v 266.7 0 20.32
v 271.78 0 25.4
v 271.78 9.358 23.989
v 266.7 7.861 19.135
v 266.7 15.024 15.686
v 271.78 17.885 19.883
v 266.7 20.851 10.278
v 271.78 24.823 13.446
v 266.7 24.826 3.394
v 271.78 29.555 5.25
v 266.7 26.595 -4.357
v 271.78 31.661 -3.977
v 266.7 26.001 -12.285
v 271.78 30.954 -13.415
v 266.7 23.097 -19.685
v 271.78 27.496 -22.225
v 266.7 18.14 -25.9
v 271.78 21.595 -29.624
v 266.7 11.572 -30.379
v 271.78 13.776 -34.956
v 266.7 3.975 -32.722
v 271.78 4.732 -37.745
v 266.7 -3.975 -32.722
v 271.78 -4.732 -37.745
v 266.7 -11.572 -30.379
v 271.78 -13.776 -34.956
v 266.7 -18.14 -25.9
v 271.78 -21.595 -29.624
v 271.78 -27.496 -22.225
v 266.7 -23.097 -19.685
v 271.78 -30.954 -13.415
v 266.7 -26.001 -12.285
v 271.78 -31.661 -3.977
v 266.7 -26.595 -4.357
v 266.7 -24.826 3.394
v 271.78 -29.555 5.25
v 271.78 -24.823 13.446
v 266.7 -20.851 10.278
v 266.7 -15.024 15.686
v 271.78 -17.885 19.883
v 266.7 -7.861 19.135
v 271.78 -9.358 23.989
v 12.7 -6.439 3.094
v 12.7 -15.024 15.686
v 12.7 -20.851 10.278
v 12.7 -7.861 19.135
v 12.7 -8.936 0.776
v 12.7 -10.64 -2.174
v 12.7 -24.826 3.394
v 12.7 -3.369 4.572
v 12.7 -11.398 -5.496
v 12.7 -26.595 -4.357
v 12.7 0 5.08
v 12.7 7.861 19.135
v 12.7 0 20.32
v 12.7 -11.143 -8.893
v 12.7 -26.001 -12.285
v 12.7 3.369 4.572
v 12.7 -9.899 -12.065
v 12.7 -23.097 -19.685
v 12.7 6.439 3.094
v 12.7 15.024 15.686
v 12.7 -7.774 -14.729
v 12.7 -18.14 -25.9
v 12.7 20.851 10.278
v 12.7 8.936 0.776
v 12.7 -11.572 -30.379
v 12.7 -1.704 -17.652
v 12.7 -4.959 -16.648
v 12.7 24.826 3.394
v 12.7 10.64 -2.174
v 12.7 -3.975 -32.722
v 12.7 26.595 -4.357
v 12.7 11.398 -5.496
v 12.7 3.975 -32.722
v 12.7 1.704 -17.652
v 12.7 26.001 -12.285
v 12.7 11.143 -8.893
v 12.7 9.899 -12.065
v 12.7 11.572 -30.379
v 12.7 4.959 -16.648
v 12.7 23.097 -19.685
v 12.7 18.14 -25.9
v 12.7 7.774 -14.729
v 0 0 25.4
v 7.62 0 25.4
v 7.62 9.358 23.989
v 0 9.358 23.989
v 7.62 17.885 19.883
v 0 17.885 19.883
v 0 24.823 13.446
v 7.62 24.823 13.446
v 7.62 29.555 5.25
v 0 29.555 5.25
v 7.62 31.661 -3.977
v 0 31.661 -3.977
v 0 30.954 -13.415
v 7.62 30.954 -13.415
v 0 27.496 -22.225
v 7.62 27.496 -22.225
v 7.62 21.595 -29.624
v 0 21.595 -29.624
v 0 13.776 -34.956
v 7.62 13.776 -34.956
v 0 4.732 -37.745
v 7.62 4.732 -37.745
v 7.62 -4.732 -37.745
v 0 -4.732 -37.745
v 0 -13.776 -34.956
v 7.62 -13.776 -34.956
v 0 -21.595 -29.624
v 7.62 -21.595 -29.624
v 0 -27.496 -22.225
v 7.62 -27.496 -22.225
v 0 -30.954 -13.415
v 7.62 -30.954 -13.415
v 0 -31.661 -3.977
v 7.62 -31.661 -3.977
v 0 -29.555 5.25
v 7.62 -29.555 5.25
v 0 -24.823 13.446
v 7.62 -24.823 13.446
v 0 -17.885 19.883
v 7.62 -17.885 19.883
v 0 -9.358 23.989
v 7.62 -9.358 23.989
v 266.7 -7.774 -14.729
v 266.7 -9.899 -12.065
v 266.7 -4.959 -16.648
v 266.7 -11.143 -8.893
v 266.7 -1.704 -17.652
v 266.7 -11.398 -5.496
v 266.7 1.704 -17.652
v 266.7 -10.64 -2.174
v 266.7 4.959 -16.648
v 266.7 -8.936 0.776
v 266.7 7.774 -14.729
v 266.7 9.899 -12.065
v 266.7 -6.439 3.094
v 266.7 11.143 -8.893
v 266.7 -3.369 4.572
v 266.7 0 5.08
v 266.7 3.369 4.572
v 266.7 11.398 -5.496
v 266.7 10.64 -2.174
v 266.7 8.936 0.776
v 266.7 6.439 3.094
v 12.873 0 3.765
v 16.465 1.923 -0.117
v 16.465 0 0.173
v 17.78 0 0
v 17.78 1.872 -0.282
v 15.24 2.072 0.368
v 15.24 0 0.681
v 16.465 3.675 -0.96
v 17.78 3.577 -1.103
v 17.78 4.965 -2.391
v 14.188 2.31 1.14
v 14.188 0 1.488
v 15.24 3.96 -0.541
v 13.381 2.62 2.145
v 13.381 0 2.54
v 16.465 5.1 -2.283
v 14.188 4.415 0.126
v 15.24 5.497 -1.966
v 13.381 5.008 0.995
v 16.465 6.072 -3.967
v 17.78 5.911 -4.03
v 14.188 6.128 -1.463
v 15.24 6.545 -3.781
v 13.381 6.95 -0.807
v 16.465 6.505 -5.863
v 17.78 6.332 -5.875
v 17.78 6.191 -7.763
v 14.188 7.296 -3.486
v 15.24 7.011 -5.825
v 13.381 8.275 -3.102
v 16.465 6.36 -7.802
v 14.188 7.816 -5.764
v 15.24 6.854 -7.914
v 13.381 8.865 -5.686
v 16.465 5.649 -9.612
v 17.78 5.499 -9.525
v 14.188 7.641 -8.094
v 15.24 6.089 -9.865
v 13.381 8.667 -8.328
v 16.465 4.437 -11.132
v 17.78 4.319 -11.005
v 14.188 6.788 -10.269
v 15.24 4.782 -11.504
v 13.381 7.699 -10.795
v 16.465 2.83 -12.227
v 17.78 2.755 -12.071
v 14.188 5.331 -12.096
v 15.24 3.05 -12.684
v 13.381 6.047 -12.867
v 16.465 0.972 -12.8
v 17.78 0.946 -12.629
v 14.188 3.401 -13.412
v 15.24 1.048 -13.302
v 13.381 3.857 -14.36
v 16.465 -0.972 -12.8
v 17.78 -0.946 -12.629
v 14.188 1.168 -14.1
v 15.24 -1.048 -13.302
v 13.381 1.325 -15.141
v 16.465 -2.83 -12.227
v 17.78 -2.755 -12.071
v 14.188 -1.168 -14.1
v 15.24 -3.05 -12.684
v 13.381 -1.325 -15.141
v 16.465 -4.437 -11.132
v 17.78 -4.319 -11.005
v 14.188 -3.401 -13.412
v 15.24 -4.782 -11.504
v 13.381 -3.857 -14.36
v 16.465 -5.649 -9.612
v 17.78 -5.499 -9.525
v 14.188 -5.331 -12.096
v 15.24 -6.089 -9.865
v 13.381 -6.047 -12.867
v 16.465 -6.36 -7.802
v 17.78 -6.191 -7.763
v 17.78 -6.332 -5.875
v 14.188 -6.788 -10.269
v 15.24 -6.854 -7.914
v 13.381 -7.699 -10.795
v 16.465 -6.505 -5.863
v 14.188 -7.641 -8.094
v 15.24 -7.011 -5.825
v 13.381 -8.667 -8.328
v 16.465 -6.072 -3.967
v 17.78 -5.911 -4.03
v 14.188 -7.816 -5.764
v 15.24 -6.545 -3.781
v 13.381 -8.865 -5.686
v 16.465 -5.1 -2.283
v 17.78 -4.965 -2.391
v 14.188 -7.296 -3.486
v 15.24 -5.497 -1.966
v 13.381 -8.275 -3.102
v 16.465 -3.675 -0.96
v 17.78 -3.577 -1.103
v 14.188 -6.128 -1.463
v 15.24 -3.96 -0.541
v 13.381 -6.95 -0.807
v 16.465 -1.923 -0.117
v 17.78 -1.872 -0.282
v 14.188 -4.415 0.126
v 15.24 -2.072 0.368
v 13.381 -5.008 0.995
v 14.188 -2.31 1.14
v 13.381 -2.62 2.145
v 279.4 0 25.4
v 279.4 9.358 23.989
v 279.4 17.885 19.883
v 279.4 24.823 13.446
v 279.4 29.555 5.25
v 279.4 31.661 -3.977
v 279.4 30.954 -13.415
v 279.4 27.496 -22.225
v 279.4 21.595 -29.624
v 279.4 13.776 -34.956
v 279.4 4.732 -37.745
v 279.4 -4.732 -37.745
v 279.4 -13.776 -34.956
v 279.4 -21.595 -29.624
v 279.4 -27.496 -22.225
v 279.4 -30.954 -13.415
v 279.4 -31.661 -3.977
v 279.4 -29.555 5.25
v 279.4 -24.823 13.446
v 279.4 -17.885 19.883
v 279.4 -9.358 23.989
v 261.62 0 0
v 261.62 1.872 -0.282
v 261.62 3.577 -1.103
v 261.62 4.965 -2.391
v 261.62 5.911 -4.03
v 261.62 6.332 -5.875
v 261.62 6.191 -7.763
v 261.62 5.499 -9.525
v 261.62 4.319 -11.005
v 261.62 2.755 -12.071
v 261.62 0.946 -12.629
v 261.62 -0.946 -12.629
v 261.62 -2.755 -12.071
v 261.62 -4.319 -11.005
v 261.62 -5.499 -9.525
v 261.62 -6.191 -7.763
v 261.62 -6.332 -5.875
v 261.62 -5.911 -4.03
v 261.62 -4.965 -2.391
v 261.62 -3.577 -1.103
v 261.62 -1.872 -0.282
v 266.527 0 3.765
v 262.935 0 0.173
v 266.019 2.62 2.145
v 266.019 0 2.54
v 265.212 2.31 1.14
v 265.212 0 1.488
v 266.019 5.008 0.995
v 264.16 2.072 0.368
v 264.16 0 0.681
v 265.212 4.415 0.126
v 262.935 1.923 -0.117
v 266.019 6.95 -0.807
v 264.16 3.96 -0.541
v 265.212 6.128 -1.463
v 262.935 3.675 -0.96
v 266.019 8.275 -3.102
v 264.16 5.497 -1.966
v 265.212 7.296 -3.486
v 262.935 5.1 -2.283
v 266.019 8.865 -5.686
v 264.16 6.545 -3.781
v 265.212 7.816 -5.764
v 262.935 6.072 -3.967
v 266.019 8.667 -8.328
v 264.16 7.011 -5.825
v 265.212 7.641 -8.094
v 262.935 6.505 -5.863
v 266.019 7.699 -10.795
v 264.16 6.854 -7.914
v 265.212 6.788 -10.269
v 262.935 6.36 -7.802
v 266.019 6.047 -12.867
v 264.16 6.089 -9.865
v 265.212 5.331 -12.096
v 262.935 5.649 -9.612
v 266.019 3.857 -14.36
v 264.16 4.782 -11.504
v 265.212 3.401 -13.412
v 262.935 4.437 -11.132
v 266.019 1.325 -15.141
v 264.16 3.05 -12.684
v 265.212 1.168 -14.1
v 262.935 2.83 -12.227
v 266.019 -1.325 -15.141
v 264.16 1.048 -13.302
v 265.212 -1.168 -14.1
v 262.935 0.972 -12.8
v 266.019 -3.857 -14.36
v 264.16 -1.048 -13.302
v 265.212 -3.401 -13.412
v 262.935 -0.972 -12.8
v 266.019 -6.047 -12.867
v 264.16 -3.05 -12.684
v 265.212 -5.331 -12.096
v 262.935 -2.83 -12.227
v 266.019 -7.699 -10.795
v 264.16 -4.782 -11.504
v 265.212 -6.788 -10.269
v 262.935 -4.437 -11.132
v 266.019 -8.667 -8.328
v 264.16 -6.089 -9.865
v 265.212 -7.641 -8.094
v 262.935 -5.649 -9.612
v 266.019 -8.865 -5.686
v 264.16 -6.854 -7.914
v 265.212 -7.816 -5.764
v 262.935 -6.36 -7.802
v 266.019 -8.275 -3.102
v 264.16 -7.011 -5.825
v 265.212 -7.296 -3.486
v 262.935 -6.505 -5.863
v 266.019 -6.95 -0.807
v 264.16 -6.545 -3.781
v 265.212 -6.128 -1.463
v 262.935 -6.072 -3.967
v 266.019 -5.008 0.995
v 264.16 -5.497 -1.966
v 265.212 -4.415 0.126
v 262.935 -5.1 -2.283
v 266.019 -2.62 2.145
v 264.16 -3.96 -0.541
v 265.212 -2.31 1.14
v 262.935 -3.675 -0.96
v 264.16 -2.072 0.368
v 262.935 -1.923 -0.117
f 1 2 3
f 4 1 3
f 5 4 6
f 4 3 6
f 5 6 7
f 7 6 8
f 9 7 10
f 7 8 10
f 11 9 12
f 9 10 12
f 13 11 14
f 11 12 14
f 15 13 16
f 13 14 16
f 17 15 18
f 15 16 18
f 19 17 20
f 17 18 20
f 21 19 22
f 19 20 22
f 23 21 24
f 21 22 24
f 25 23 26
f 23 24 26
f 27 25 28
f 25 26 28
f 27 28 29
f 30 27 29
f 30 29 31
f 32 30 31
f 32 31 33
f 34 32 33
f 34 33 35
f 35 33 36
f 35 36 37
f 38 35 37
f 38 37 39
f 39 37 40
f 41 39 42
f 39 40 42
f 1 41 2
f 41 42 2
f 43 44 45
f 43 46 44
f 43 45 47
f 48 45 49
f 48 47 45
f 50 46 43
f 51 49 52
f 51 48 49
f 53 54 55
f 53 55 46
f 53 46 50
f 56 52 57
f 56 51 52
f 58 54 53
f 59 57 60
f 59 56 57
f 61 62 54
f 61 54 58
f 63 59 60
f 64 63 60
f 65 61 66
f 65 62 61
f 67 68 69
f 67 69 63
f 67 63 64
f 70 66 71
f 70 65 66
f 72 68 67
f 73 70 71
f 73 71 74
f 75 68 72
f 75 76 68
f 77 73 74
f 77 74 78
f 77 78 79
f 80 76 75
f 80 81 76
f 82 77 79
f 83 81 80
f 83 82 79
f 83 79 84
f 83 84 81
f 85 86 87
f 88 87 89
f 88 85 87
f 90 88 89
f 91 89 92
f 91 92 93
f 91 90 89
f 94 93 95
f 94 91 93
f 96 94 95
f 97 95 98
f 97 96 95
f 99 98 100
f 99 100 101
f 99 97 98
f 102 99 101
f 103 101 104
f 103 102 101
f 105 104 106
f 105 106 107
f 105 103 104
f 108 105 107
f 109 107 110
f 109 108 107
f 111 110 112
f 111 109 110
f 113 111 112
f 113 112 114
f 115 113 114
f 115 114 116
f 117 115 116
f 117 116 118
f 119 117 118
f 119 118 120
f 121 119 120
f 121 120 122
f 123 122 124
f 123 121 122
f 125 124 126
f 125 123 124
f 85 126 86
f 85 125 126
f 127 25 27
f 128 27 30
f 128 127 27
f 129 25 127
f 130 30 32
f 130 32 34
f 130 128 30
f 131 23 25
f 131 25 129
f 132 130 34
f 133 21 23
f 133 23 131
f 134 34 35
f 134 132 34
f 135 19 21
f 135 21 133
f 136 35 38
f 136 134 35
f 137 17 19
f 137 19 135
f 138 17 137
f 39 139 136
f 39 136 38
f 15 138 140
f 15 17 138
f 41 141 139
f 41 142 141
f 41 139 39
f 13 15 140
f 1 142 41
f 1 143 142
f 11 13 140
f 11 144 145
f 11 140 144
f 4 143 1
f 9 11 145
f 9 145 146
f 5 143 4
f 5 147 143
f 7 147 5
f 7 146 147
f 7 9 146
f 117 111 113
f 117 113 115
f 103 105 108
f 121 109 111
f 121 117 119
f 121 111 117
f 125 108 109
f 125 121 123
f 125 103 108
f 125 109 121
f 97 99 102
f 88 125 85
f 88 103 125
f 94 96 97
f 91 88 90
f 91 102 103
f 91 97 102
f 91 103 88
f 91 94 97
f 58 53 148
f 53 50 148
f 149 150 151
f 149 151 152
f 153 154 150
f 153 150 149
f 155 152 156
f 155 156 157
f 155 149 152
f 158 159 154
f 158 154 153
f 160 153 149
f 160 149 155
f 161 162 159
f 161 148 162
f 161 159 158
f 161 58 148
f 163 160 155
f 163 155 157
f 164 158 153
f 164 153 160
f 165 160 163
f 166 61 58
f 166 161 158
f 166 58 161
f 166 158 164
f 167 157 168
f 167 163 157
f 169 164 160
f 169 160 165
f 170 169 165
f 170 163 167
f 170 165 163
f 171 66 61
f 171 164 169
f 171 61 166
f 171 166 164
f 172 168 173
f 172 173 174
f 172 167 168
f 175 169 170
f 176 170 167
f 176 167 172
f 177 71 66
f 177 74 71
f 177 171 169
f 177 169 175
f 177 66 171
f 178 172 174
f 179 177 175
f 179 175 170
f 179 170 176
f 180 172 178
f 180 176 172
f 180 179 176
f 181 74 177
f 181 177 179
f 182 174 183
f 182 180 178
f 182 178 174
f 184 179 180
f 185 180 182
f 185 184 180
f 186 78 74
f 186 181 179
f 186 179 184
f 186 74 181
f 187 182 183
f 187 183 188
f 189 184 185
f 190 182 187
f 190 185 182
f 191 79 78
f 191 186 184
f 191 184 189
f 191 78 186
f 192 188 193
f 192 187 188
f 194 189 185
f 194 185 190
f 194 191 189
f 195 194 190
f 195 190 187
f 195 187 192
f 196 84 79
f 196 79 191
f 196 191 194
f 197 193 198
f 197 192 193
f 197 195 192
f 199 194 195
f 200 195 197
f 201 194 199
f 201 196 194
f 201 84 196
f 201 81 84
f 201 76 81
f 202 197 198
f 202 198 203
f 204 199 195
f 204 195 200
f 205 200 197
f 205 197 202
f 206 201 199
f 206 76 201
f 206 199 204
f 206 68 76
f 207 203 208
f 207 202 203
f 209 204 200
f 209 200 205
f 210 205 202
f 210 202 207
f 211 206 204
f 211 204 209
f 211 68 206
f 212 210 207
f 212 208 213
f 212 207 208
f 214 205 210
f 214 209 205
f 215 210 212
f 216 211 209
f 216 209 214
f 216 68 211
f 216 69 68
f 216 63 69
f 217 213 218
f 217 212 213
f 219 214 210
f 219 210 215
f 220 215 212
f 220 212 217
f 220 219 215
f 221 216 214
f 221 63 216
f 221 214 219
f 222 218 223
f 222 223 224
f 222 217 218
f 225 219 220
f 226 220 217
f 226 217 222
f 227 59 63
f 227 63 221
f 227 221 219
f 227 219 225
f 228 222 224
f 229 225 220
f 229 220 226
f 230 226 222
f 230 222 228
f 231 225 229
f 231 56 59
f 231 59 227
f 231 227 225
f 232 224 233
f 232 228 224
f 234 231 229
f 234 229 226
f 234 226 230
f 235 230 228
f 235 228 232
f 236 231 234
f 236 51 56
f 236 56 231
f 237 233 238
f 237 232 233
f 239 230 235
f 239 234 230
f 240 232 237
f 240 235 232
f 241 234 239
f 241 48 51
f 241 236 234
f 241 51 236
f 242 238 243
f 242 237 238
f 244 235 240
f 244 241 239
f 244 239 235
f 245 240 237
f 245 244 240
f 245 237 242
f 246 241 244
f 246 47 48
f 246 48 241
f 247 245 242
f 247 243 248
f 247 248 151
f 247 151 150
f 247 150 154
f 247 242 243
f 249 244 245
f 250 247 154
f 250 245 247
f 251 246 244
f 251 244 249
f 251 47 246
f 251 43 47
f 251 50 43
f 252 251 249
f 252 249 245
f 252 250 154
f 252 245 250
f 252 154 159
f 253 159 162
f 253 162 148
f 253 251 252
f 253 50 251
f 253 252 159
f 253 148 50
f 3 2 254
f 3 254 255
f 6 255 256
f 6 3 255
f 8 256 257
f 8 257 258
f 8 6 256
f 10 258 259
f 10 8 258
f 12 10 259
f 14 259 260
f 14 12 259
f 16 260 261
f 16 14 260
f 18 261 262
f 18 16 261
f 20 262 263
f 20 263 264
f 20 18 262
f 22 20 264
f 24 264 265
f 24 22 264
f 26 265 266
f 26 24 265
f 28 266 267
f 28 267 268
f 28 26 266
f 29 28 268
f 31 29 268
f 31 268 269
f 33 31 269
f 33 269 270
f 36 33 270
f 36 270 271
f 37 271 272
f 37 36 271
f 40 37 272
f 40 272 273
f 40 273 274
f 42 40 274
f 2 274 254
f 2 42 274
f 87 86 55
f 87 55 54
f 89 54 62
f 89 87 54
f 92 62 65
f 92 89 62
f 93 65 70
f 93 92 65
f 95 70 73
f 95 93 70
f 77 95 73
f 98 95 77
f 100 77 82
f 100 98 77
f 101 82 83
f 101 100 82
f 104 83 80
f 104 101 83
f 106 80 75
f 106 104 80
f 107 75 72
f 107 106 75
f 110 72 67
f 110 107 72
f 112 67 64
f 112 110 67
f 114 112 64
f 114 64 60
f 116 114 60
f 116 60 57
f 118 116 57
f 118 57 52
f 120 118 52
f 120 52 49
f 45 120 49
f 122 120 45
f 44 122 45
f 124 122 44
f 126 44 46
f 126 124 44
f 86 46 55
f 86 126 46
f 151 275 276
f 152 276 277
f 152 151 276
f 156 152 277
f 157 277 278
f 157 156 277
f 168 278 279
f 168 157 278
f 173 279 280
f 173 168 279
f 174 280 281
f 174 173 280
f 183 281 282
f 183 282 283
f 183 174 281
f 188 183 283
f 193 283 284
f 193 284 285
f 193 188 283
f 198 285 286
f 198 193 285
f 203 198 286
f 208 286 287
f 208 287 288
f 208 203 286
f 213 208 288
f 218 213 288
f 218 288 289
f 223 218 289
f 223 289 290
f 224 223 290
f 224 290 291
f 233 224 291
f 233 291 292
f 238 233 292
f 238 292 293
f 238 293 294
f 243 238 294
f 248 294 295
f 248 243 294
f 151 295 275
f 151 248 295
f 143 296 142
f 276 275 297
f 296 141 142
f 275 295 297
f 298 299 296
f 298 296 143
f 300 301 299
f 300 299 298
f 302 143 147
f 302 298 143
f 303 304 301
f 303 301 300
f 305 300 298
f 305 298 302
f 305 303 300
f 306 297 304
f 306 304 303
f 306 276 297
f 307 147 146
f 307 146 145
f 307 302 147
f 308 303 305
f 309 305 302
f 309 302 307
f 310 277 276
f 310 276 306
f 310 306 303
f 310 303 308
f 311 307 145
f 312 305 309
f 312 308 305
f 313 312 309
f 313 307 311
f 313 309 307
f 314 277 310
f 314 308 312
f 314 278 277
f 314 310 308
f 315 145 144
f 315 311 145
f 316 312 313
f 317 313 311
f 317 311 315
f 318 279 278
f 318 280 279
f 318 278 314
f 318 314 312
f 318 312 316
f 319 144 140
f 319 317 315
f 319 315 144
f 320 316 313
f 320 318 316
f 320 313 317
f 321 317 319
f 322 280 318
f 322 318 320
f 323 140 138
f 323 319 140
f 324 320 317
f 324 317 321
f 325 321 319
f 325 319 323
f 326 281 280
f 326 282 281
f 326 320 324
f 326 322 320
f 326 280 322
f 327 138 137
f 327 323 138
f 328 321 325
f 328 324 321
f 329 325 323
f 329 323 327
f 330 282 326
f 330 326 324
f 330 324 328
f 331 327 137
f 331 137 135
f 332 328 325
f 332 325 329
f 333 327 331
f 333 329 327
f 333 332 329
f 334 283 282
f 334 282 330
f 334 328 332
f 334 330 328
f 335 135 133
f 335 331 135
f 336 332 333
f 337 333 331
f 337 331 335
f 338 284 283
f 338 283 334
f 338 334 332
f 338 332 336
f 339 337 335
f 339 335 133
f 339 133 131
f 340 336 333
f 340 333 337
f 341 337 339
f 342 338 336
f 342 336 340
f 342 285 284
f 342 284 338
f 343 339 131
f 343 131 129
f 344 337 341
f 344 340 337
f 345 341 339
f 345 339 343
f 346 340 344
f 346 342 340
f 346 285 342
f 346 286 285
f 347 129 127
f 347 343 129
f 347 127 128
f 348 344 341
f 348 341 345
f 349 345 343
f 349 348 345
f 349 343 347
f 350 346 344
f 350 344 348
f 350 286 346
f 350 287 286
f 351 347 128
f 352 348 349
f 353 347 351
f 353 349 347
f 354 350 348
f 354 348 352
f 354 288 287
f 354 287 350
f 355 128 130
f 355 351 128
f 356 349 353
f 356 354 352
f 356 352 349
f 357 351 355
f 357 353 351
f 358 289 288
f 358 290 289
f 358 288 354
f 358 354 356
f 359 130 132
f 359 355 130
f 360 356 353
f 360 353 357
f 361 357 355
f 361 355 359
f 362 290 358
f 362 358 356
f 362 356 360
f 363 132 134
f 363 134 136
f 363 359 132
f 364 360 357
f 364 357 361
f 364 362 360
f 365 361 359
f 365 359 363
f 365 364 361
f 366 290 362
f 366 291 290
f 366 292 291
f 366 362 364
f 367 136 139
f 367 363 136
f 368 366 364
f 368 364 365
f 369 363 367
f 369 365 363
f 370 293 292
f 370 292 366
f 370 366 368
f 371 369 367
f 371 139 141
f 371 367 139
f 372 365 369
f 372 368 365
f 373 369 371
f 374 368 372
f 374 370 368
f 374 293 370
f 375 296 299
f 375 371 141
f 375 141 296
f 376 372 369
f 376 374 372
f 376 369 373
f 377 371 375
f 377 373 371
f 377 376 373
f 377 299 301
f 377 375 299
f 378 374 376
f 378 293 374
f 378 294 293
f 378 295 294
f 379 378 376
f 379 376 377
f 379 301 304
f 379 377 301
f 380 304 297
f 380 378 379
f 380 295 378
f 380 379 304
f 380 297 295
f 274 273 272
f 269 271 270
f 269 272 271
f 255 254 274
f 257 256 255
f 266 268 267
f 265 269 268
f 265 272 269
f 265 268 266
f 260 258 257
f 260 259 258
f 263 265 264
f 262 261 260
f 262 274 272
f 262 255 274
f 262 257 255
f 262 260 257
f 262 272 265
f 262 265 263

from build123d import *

# Parameters (mm, degrees)
F2_R    = 5.08
F3_SIZE = 5.08
F4_SIZE = 5.08


with BuildPart() as f1:
    # F0 (on Front) → F1 (revolve)
    with BuildSketch(Plane.XZ):
        Polygon((12.7, 25.4), (0, 25.4), (0, -6.35), (130.3428560495, -6.35), (279.4, -6.35), (279.4, 25.4), (266.7, 25.4), (266.7, 0), (12.7, 0), align=None)
    revolve(axis=Axis((139.7, 0, -6.35), (-1, 0, 0)))

    # F2
    f2_edges = [f1.edges().sort_by_distance(p)[0] for p in [
        (12.7, 0, -12.7),
        (266.7, 0, -12.7),
    ]]
    fillet(f2_edges, radius=F2_R)

    # F3
    f3_edges = [f1.edges().sort_by_distance(p)[0] for p in [
        (12.7, 0, -38.1),
    ]]
    chamfer(f3_edges, length=F3_SIZE)

    # F4
    f4_edges = [f1.edges().sort_by_distance(p)[0] for p in [
        (266.7, 0, -38.1),
    ]]
    chamfer(f4_edges, length=F4_SIZE)


solid = f1.part
